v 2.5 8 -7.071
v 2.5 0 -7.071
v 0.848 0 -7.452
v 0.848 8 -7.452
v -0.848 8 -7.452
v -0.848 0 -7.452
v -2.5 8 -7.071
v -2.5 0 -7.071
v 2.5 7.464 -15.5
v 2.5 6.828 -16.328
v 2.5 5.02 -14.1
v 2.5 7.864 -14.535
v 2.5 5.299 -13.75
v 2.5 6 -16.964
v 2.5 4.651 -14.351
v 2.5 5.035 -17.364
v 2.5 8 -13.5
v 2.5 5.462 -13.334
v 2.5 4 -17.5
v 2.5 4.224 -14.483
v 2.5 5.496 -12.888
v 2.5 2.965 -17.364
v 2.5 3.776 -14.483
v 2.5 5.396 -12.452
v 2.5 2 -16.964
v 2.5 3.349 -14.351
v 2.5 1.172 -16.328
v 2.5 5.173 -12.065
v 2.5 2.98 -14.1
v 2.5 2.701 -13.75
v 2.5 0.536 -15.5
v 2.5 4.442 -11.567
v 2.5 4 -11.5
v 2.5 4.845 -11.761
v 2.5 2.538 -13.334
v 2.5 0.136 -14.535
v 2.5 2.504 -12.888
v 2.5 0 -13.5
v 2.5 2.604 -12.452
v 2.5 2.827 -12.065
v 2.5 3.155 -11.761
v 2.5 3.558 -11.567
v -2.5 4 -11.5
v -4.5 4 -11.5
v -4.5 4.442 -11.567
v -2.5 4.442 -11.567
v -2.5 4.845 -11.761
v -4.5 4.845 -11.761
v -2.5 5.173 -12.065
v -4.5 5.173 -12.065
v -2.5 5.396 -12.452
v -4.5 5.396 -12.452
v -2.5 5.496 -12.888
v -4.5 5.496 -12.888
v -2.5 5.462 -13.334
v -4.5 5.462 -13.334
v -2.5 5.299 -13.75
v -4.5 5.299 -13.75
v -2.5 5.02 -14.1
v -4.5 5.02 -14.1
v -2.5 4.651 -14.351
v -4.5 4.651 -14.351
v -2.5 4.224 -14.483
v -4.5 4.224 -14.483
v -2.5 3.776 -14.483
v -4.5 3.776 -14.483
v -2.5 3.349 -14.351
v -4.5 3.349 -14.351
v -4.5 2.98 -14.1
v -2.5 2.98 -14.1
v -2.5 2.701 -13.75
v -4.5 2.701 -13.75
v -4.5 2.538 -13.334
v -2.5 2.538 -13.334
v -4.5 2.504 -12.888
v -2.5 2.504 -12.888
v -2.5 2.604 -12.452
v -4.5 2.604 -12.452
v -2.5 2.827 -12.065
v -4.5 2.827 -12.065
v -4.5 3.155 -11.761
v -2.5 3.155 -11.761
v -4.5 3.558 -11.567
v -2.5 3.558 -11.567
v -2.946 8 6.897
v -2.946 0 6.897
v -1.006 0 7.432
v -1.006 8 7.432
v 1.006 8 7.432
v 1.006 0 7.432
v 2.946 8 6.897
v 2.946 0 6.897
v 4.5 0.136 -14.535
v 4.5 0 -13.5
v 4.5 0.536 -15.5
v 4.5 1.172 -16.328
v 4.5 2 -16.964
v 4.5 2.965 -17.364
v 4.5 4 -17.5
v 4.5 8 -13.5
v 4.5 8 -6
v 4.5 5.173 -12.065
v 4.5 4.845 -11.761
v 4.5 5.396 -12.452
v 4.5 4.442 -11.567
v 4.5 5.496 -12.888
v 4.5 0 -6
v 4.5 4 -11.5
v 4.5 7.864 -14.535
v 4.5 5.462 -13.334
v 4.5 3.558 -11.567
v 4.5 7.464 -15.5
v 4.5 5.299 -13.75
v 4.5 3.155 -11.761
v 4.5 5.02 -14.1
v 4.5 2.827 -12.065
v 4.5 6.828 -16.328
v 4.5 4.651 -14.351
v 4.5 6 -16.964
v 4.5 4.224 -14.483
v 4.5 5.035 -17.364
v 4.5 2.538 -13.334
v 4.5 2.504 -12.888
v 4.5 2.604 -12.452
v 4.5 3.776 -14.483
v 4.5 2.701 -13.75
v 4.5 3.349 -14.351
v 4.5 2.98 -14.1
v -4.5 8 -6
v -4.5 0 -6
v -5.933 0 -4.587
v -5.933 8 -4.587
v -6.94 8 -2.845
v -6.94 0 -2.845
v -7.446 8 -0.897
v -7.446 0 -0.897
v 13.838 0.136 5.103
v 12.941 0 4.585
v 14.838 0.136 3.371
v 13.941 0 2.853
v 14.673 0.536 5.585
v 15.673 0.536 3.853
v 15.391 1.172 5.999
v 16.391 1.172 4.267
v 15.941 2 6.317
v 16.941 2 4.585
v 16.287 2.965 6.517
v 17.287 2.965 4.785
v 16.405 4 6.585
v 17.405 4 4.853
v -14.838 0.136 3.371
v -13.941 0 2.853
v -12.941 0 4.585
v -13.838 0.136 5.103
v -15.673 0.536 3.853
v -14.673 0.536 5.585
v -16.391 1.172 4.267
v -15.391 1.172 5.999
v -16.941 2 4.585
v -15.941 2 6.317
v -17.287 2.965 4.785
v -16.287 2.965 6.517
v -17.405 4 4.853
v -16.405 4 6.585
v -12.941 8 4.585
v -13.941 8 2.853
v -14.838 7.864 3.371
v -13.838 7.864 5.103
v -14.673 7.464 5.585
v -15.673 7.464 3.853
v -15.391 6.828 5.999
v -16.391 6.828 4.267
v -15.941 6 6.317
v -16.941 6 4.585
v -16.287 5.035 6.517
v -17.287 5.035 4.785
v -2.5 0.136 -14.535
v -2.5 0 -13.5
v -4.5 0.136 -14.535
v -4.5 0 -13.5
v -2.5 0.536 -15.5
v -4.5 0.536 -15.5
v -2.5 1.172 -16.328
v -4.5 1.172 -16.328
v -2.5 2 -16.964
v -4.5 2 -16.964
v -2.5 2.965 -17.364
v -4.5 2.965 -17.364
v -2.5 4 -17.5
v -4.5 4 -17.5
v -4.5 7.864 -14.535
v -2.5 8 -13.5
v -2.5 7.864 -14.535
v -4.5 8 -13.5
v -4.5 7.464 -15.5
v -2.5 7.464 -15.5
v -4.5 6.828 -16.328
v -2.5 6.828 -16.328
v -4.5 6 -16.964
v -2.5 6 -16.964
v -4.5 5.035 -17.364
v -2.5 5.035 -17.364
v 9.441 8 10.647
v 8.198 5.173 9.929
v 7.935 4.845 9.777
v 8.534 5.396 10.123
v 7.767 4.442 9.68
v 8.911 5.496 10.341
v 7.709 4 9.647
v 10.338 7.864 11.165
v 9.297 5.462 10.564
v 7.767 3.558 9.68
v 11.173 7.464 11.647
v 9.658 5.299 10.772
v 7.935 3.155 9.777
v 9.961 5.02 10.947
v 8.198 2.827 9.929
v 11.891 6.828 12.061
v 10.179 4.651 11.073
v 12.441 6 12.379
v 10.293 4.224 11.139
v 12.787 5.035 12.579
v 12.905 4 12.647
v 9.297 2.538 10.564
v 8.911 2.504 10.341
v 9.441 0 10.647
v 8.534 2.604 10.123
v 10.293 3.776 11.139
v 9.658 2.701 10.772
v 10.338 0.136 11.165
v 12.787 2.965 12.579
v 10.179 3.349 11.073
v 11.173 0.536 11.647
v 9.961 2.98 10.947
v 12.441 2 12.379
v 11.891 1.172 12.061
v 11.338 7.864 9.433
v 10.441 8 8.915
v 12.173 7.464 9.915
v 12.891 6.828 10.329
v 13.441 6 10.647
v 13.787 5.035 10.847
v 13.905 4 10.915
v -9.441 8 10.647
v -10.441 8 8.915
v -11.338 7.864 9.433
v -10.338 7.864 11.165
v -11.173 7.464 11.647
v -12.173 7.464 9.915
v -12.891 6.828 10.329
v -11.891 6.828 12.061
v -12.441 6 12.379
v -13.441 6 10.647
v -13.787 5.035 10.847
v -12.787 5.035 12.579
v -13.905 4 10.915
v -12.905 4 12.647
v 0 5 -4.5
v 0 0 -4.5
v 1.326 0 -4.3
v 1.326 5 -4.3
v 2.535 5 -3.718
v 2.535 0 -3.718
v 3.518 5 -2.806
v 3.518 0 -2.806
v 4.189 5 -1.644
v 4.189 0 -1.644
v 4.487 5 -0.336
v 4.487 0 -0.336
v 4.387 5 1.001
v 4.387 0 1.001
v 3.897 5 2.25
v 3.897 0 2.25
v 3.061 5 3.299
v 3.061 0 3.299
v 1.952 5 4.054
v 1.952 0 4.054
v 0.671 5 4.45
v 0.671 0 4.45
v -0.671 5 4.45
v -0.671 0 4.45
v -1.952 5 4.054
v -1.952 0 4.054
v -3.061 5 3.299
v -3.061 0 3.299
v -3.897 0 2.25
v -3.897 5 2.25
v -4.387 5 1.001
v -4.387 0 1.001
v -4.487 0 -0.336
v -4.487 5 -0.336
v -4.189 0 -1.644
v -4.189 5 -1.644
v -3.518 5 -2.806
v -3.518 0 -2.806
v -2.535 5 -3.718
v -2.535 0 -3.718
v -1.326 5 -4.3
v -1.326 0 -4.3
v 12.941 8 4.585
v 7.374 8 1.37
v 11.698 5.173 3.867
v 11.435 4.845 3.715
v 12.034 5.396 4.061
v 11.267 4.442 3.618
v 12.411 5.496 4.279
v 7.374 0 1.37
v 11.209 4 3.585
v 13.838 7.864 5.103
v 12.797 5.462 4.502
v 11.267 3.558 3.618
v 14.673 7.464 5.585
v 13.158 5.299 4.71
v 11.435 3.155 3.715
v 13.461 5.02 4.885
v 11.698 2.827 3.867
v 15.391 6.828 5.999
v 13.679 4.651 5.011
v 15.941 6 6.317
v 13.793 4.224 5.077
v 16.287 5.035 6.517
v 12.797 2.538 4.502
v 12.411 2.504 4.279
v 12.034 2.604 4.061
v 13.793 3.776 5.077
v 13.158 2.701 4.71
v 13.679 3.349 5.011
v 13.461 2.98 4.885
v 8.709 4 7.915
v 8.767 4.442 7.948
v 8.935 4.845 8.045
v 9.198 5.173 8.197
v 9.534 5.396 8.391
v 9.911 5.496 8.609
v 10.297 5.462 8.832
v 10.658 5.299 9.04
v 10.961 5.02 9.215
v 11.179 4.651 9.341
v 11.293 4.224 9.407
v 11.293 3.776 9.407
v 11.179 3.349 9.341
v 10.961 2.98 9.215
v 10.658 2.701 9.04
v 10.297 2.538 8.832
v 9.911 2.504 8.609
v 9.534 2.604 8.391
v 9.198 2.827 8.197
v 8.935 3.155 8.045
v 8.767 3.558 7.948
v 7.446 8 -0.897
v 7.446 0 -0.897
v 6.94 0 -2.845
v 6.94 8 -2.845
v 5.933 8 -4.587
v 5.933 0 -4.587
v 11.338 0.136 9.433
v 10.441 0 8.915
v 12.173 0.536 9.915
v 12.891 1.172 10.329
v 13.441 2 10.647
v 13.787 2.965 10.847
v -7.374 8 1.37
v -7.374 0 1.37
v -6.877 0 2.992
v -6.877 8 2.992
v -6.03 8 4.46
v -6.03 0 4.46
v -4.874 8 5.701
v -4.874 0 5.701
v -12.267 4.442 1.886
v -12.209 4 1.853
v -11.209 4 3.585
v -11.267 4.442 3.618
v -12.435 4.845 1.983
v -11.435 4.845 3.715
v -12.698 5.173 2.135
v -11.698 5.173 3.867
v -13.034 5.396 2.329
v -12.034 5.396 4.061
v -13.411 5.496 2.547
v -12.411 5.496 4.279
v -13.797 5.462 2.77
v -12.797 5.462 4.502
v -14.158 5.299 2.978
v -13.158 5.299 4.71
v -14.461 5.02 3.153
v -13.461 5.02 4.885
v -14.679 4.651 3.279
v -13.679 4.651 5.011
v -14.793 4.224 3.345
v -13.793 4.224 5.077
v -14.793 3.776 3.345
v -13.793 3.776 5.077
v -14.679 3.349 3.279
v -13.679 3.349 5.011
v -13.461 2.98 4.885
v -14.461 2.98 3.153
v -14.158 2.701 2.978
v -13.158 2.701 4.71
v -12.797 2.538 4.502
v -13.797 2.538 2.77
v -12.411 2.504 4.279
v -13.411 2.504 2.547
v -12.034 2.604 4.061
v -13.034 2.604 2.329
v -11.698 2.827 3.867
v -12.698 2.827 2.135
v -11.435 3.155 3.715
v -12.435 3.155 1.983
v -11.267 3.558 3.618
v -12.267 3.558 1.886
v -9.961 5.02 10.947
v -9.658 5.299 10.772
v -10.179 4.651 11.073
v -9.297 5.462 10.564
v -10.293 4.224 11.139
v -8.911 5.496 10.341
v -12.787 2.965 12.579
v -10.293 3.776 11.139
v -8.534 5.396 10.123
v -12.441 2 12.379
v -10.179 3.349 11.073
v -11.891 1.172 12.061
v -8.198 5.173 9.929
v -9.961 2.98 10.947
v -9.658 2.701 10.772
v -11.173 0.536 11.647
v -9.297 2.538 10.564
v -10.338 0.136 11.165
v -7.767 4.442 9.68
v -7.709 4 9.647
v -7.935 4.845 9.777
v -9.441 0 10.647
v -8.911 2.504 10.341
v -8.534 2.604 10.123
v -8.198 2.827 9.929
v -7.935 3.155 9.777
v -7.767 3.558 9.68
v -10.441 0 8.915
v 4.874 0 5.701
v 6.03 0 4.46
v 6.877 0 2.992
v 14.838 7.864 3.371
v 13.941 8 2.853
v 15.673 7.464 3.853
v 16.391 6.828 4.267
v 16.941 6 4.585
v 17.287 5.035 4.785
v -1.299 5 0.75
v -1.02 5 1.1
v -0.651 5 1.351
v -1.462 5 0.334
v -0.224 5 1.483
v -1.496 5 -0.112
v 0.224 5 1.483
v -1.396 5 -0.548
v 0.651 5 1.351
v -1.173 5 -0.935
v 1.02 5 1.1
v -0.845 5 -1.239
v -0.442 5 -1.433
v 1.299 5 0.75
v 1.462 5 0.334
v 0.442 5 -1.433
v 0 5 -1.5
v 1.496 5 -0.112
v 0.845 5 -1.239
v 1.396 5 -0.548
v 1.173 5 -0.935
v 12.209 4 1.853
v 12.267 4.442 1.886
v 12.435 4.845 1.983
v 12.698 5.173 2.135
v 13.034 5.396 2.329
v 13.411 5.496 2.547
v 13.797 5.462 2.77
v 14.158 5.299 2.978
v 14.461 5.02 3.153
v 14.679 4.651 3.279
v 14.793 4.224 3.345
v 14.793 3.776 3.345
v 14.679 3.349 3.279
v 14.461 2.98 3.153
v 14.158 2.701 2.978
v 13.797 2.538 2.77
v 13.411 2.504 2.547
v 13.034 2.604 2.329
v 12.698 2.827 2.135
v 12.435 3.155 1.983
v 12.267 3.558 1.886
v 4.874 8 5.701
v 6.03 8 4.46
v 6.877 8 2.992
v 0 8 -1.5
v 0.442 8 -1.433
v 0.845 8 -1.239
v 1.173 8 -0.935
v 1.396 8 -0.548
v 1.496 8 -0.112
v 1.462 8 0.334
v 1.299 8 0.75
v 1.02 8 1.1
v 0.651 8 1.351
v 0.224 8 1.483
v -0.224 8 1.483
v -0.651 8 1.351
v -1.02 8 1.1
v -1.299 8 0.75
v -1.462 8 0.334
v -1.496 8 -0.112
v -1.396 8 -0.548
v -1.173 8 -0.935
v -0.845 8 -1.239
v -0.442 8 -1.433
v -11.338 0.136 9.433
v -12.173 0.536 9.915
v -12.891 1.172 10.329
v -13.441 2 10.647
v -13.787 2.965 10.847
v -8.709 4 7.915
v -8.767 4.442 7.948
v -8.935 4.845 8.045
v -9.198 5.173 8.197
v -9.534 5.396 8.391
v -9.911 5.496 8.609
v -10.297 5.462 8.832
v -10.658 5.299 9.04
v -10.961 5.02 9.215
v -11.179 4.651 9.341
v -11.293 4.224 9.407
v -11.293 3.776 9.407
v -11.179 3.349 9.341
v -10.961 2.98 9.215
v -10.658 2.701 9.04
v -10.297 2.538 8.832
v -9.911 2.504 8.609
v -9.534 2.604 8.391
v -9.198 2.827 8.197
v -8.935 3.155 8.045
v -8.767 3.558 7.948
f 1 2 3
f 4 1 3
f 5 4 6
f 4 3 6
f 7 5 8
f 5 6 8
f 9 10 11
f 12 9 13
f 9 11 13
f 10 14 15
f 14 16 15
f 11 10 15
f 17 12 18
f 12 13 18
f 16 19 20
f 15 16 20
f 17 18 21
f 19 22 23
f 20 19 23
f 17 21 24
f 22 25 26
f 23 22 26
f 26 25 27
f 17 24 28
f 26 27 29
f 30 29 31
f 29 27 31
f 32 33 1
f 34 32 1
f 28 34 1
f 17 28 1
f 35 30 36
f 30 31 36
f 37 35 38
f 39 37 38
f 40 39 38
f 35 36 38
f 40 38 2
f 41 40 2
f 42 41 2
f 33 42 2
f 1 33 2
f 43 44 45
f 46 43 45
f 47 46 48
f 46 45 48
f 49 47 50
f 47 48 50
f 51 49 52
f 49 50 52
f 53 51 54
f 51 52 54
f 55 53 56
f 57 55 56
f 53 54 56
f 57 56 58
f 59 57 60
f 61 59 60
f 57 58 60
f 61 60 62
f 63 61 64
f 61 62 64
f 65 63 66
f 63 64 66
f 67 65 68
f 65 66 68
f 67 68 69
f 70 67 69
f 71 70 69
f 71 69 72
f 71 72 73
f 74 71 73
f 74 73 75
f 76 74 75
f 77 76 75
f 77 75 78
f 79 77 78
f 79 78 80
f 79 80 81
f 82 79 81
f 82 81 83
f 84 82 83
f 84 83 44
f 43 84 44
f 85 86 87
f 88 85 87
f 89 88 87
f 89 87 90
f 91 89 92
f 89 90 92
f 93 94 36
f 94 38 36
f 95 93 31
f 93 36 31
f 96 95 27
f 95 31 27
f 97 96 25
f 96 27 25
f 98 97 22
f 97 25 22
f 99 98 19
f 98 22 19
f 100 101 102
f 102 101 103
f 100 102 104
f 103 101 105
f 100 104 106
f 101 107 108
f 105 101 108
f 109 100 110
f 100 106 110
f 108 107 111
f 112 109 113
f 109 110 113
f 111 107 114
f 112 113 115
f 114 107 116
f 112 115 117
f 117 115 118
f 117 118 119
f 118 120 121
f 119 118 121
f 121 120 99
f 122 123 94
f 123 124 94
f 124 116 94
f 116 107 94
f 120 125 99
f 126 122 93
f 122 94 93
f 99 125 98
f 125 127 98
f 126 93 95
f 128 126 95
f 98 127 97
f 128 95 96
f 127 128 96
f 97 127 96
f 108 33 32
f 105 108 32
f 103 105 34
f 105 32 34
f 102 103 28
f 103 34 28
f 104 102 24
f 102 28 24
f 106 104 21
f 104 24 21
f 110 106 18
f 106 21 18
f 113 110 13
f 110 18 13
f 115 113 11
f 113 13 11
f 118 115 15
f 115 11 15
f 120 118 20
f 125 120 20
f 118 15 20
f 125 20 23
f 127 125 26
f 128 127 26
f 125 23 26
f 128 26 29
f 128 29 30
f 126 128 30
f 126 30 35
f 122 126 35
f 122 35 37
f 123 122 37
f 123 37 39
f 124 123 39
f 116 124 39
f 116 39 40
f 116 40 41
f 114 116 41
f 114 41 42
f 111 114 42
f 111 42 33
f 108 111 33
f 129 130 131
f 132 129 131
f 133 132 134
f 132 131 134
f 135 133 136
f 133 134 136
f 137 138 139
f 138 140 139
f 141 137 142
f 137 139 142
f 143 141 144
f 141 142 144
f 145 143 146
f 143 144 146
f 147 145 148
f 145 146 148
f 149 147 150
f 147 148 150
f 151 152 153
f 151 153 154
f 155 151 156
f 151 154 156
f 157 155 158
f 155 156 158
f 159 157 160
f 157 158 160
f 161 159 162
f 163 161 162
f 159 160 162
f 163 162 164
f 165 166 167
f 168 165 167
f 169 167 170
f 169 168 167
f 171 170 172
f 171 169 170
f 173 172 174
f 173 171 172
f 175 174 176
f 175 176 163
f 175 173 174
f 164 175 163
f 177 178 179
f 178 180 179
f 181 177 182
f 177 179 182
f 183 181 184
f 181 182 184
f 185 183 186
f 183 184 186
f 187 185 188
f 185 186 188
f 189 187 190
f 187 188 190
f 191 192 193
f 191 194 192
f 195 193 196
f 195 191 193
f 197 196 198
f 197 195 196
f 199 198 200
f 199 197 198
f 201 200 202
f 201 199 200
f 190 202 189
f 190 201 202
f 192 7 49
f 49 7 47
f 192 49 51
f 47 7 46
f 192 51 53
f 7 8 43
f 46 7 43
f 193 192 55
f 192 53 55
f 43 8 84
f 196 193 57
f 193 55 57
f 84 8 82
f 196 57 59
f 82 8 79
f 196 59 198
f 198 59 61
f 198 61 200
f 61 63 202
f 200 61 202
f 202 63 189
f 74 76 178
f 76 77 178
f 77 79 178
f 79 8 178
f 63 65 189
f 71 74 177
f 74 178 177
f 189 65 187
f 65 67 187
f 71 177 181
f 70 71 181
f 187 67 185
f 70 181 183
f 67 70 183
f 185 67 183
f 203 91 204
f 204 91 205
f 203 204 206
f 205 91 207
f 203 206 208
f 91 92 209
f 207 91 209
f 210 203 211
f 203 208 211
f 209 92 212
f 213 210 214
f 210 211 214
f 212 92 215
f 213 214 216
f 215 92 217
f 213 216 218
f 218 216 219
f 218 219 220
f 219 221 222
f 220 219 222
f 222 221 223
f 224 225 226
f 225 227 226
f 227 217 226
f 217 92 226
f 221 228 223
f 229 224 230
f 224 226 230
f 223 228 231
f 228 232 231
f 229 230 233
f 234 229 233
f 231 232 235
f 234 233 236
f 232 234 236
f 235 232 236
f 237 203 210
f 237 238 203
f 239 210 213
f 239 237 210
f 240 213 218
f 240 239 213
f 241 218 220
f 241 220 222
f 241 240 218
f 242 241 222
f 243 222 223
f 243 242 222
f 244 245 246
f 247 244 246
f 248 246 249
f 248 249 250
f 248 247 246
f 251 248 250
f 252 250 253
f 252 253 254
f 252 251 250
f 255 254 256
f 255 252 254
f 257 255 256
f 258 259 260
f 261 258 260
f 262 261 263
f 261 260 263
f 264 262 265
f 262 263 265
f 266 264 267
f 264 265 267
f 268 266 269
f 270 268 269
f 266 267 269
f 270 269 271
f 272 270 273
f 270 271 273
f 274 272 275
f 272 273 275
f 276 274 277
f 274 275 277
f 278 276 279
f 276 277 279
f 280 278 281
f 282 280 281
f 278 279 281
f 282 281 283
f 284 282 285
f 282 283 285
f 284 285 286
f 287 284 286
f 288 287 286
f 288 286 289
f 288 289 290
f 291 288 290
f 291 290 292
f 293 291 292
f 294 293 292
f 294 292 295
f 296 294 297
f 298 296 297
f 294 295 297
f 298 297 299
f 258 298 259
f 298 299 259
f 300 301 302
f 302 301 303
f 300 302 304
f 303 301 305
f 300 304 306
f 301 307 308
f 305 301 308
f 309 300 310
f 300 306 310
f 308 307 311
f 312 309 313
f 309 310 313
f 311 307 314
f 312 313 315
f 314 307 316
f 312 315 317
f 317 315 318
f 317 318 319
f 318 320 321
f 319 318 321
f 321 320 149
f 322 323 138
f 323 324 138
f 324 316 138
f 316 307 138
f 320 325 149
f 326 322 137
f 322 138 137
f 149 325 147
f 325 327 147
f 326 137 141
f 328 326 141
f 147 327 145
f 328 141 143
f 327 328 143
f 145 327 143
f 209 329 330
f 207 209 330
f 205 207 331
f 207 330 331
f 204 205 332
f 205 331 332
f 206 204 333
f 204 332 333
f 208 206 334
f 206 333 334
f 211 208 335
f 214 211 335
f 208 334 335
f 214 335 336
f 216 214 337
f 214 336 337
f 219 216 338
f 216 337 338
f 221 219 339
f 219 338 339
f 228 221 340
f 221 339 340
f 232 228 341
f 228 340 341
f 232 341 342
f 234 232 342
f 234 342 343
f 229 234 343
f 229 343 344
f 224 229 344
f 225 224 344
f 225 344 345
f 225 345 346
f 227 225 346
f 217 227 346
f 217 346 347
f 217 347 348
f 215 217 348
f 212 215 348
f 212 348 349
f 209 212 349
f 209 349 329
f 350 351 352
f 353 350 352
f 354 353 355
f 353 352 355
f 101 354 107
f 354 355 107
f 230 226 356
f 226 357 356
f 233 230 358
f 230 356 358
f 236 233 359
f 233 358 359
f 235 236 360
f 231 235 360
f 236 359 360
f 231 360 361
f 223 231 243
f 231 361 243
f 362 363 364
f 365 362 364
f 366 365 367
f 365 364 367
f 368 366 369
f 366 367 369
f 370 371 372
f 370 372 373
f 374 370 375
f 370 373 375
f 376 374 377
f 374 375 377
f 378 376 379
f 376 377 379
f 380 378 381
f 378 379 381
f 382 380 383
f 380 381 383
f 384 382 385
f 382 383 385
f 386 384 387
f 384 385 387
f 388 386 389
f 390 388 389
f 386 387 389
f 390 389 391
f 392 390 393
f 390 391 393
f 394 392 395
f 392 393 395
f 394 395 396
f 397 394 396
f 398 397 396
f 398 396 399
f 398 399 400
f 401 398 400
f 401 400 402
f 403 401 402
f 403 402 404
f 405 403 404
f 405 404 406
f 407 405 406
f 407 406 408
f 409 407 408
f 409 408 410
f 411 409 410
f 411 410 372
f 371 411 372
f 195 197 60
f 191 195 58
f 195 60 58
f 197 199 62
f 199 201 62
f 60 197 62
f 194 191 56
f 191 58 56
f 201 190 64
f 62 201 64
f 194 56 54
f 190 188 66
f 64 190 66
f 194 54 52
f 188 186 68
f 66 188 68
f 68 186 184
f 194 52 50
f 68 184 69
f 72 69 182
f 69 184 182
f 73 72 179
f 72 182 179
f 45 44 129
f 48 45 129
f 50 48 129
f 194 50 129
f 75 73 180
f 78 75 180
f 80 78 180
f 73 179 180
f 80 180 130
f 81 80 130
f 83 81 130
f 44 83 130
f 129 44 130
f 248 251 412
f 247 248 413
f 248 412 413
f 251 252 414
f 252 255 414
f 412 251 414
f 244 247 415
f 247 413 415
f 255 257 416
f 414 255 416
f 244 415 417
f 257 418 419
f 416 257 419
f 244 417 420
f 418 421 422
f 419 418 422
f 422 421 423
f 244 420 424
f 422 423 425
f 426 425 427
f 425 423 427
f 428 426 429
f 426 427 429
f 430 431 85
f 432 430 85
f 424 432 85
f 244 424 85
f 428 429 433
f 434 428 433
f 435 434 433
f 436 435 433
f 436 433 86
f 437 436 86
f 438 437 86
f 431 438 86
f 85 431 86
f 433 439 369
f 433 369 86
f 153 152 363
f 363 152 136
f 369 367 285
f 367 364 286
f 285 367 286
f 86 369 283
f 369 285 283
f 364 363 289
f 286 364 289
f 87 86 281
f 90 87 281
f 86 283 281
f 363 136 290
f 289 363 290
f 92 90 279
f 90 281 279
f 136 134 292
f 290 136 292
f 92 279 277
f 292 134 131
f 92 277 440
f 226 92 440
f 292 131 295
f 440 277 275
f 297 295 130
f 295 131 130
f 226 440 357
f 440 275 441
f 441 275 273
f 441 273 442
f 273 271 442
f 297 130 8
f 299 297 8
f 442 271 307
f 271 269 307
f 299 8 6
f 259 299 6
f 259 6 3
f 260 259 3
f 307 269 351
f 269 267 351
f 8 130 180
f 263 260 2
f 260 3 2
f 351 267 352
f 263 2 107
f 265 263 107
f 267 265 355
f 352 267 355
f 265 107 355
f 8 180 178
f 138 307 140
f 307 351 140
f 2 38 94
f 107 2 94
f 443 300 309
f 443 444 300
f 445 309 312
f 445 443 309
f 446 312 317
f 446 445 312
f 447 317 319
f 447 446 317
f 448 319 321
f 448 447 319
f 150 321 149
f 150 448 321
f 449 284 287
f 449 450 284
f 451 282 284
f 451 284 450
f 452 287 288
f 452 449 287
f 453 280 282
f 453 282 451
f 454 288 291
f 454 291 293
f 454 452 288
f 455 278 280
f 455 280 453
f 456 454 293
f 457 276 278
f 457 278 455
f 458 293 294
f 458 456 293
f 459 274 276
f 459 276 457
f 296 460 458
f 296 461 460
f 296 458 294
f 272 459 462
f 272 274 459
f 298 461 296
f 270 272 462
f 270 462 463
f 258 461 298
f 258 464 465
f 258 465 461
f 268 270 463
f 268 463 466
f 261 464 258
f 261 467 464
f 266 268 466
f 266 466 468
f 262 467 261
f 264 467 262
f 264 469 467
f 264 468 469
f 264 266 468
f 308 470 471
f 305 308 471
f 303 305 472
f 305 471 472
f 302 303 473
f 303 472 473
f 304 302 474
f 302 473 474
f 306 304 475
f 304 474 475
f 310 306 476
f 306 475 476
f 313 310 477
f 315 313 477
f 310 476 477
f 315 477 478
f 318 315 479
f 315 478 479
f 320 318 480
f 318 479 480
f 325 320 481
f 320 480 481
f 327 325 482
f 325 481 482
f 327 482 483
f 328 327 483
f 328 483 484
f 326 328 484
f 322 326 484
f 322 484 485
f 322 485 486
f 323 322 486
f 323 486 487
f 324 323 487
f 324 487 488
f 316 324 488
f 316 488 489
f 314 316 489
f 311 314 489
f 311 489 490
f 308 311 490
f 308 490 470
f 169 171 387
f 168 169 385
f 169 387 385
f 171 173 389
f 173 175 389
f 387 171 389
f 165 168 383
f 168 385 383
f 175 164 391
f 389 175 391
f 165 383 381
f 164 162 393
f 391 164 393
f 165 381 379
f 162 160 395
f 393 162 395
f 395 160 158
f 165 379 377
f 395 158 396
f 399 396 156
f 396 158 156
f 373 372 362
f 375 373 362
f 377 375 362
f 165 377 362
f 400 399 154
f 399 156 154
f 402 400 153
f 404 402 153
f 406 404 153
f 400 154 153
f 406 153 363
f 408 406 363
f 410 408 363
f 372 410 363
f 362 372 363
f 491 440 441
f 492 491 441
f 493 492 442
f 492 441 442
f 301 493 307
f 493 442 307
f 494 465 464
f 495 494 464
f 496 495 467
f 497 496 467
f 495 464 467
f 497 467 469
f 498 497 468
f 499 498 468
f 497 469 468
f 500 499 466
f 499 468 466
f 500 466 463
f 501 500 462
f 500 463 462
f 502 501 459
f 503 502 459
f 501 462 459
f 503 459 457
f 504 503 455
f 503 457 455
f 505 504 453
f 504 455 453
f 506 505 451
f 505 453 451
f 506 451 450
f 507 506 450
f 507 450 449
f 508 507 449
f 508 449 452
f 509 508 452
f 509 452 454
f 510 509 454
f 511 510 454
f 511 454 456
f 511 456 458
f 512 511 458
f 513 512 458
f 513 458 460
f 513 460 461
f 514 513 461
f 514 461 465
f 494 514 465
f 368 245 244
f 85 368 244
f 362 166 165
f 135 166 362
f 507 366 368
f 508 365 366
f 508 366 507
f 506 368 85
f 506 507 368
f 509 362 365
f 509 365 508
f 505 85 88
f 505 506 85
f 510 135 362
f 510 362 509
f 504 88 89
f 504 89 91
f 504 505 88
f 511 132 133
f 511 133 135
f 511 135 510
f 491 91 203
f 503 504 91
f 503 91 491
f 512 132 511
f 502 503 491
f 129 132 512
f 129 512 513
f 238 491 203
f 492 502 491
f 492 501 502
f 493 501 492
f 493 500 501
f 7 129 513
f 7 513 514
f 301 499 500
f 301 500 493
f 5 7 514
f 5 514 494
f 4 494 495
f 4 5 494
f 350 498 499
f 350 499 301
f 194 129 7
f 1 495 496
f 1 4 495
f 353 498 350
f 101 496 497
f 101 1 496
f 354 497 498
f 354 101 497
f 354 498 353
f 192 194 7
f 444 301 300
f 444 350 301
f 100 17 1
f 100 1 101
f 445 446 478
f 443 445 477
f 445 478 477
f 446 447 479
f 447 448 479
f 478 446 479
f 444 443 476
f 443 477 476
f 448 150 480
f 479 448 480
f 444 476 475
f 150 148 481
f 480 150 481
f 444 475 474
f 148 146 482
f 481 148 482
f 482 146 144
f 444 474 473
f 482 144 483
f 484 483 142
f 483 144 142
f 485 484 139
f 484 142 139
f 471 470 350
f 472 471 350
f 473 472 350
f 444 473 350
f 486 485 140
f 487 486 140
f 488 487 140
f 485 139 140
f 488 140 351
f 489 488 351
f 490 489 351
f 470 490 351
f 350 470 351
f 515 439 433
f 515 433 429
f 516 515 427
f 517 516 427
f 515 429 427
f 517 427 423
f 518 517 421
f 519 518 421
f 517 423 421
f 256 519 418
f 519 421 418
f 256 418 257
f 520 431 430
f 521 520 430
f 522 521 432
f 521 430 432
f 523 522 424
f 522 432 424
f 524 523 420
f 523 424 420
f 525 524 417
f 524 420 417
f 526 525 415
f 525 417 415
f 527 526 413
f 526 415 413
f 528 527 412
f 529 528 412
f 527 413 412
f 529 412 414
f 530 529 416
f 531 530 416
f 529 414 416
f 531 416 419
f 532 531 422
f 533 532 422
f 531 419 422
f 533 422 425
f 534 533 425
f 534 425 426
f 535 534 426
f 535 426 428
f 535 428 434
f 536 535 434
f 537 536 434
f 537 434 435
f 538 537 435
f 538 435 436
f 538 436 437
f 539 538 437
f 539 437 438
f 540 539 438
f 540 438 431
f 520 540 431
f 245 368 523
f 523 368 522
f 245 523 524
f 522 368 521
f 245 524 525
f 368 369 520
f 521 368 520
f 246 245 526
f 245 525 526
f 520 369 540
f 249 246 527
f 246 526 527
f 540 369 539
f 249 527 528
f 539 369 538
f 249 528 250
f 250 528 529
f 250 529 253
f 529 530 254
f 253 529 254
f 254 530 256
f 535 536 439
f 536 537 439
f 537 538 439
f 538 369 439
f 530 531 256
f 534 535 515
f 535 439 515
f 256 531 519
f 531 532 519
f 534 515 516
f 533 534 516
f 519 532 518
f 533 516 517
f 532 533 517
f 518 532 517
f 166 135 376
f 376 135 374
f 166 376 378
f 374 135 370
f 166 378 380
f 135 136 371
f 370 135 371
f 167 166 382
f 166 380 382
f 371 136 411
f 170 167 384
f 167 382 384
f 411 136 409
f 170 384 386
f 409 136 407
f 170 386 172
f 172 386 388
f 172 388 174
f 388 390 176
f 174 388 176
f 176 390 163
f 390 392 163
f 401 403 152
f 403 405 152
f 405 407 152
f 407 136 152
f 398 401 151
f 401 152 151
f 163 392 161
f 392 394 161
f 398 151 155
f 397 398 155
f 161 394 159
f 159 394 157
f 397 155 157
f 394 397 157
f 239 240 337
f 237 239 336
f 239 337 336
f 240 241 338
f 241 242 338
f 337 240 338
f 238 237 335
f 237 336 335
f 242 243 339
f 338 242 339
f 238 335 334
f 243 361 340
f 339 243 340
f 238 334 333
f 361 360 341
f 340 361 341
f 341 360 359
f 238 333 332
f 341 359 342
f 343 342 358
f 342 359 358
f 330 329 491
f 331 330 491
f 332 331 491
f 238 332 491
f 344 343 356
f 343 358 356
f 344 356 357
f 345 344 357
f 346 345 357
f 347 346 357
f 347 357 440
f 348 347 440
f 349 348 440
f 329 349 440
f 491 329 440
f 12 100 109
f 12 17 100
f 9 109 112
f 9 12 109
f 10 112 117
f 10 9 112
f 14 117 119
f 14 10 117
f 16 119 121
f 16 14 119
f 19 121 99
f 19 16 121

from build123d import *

# Parameters (mm, degrees)
BOSS_EXTRUDE1_DEPTH = 8
CUT_EXTRUDE1_REACH  = 32.136
SKETCH2_R           = 1.5
CUT_EXTRUDE2_REACH  = 31.156
SKETCH3_R           = 1.5
CUT_EXTRUDE3_REACH  = 28.908
SKETCH4_R           = 1.5
SKETCH5_R           = 4.5
CUT_EXTRUDE4_DEPTH  = 5
SKETCH6_R           = 1.5
CUT_EXTRUDE5_DEPTH  = 26.183317902
FILLET1_R           = 4


with BuildPart() as part:
    # Sketch1 → Boss-Extrude1 (new body)
    with BuildSketch(Plane(origin=(0, 0, 0), x_dir=(1, 0, 0), z_dir=(0, 1, 0))):
        with BuildLine():
            ThreePointArc((-2.946152423, -6.897114317), (-3.95544326, -6.372163574), (-4.873724357, -5.700597415))
            Line((-4.873724357, -5.700597415), (-13.905444566, -10.915063509))
            Line((-13.905444566, -10.915063509), (-12.905444566, -12.647114317))
            Line((-12.905444566, -12.647114317), (-2.946152423, -6.897114317))
        make_face()
        with BuildLine():
            Line((-16.405444566, -6.584936491), (-7.373724357, -1.370470396))
            ThreePointArc((-7.373724357, -1.370470396), (-7.496177162, -0.23943256), (-7.446152423, 0.897114317))
            Line((-7.446152423, 0.897114317), (-17.405444566, -4.852885683))
            Line((-17.405444566, -4.852885683), (-16.405444566, -6.584936491))
        make_face()
        Polygon((-2.5, 1.443375673), (-2.5, 0), (0, 0), (-1.25, 2.165063509), align=None)
        Polygon((1.25, -2.165063509), (0, 0), (-1.25, -2.165063509), (0, -2.886751346), align=None)
        with BuildLine():
            Line((-7.446152423, 0.897114317), (-4.5, 2.598076211))
            Line((-4.5, 2.598076211), (-4.5, 6))
            ThreePointArc((-4.5, 6), (-6.495190528, 3.75), (-7.446152423, 0.897114317))
        make_face()
        with BuildLine():
            Line((0, -5.196152423), (-2.946152423, -6.897114317))
            ThreePointArc((-2.946152423, -6.897114317), (0, -7.5), (2.946152423, -6.897114317))
            Line((2.946152423, -6.897114317), (0, -5.196152423))
        make_face()
        Polygon((1.25, 2.165063509), (0, 0), (2.5, 0), (2.5, 1.443375673), align=None)
        with BuildLine():
            ThreePointArc((7.446152423, 0.897114317), (6.495190528, 3.75), (4.5, 6))
            Line((4.5, 6), (4.5, 2.598076211))
            Line((4.5, 2.598076211), (7.446152423, 0.897114317))
        make_face()
        with BuildLine():
            ThreePointArc((7.5, 0), (7.468364368, -0.688137822), (7.373724357, -1.370470396))
            Line((7.373724357, -1.370470396), (16.405444566, -6.584936491))
            Line((16.405444566, -6.584936491), (17.405444566, -4.852885683))
            Line((17.405444566, -4.852885683), (7.446152423, 0.897114317))
            ThreePointArc((7.446152423, 0.897114317), (7.486526002, 0.449364457), (7.5, 0))
        make_face()
        with BuildLine():
            ThreePointArc((4.873724357, -5.700597415), (3.95544326, -6.372163574), (2.946152423, -6.897114317))
            Line((2.946152423, -6.897114317), (12.905444566, -12.647114317))
            Line((12.905444566, -12.647114317), (13.905444566, -10.915063509))
            Line((13.905444566, -10.915063509), (4.873724357, -5.700597415))
        make_face()
        with BuildLine():
            Line((2.5, 17.5), (2.5, 7.071067812))
            ThreePointArc((2.5, 7.071067812), (3.540733902, 6.611596134), (4.5, 6))
            Line((4.5, 6), (4.5, 17.5))
            Line((4.5, 17.5), (2.5, 17.5))
        make_face()
        with BuildLine():
            Line((-4.5, 17.5), (-4.5, 6))
            ThreePointArc((-4.5, 6), (-3.540733902, 6.611596134), (-2.5, 7.071067812))
            Line((-2.5, 7.071067812), (-2.5, 17.5))
            Line((-2.5, 17.5), (-4.5, 17.5))
        make_face()
        with BuildLine():
            Line((-2.5, 0), (-4.5, 0))
            Line((-4.5, 0), (-4.5, 0.288675135))
            Line((-4.5, 0.288675135), (-7.373724357, -1.370470396))
            ThreePointArc((-7.373724357, -1.370470396), (-6.495190528, -3.75), (-4.873724357, -5.700597415))
            Line((-4.873724357, -5.700597415), (-2, -4.041451884))
            Line((-2, -4.041451884), (-2.25, -3.897114317))
            Line((-2.25, -3.897114317), (-1.25, -2.165063509))
            Line((-1.25, -2.165063509), (0, 0))
            Line((0, 0), (-2.5, 0))
        make_face()
        Polygon((-4.5, 0.288675135), (-4.5, 0), (-2.5, 0), (-2.5, 1.443375673), align=None)
        with BuildLine():
            Line((-7.373724357, -1.370470396), (-4.5, 0.288675135))
            Line((-4.5, 0.288675135), (-4.5, 2.598076211))
            Line((-4.5, 2.598076211), (-7.446152423, 0.897114317))
            ThreePointArc((-7.446152423, 0.897114317), (-7.496177162, -0.23943256), (-7.373724357, -1.370470396))
        make_face()
        Polygon((-4.5, 2.598076211), (-4.5, 0.288675135), (-2.5, 1.443375673), (-2.5, 3.75277675), align=None)
        with BuildLine():
            Line((-4.5, 6), (-4.5, 2.598076211))
            Line((-4.5, 2.598076211), (-2.5, 3.75277675))
            Line((-2.5, 3.75277675), (-2.5, 7.071067812))
            ThreePointArc((-2.5, 7.071067812), (-3.540733902, 6.611596134), (-4.5, 6))
        make_face()
        Polygon((-2.5, 3.75277675), (-2.5, 1.443375673), (-1.25, 2.165063509), (-2.25, 3.897114317), align=None)
        with BuildLine():
            Line((2.5, 0), (0, 0))
            Line((0, 0), (1.25, -2.165063509))
            Line((1.25, -2.165063509), (2.25, -3.897114317))
            Line((2.25, -3.897114317), (2, -4.041451884))
            Line((2, -4.041451884), (4.873724357, -5.700597415))
            ThreePointArc((4.873724357, -5.700597415), (6.495190528, -3.75), (7.373724357, -1.370470396))
            Line((7.373724357, -1.370470396), (4.5, 0.288675135))
            Line((4.5, 0.288675135), (4.5, 0))
            Line((4.5, 0), (2.5, 0))
        make_face()
        with BuildLine():
            Line((-1.25, 2.165063509), (0, 0))
            Line((0, 0), (1.25, 2.165063509))
            Line((1.25, 2.165063509), (2.25, 3.897114317))
            Line((2.25, 3.897114317), (2.5, 3.75277675))
            Line((2.5, 3.75277675), (2.5, 7.071067812))
            ThreePointArc((2.5, 7.071067812), (0, 7.5), (-2.5, 7.071067812))
            Line((-2.5, 7.071067812), (-2.5, 3.75277675))
            Line((-2.5, 3.75277675), (-2.25, 3.897114317))
            Line((-2.25, 3.897114317), (-1.25, 2.165063509))
        make_face()
        with BuildLine():
            Line((-2, -4.041451884), (-4.873724357, -5.700597415))
            ThreePointArc((-4.873724357, -5.700597415), (-3.95544326, -6.372163574), (-2.946152423, -6.897114317))
            Line((-2.946152423, -6.897114317), (0, -5.196152423))
            Line((0, -5.196152423), (-2, -4.041451884))
        make_face()
        Polygon((2.5, 1.443375673), (2.5, 0), (4.5, 0), (4.5, 0.288675135), align=None)
        Polygon((2.25, -3.897114317), (1.25, -2.165063509), (0, -2.886751346), (2, -4.041451884), align=None)
        Polygon((2.25, 3.897114317), (1.25, 2.165063509), (2.5, 1.443375673), (2.5, 3.75277675), align=None)
        Polygon((0, -2.886751346), (-1.25, -2.165063509), (-2.25, -3.897114317), (-2, -4.041451884), align=None)
        Polygon((0, -2.886751346), (-2, -4.041451884), (0, -5.196152423), (2, -4.041451884), align=None)
        Polygon((2.5, 3.75277675), (2.5, 1.443375673), (4.5, 0.288675135), (4.5, 2.598076211), align=None)
        with BuildLine():
            ThreePointArc((4.5, 6), (3.540733902, 6.611596134), (2.5, 7.071067812))
            Line((2.5, 7.071067812), (2.5, 3.75277675))
            Line((2.5, 3.75277675), (4.5, 2.598076211))
            Line((4.5, 2.598076211), (4.5, 6))
        make_face()
        with BuildLine():
            Line((2, -4.041451884), (0, -5.196152423))
            Line((0, -5.196152423), (2.946152423, -6.897114317))
            ThreePointArc((2.946152423, -6.897114317), (3.95544326, -6.372163574), (4.873724357, -5.700597415))
            Line((4.873724357, -5.700597415), (2, -4.041451884))
        make_face()
        with BuildLine():
            Line((4.5, 2.598076211), (4.5, 0.288675135))
            Line((4.5, 0.288675135), (7.373724357, -1.370470396))
            ThreePointArc((7.373724357, -1.370470396), (7.468364368, -0.688137822), (7.5, 0))
            ThreePointArc((7.5, 0), (7.486526002, 0.449364457), (7.446152423, 0.897114317))
            Line((7.446152423, 0.897114317), (4.5, 2.598076211))
        make_face()
    extrude(amount=BOSS_EXTRUDE1_DEPTH)

    # Cut-Extrude1: up to this face of the body (flat: up to its plane)
    cut_extrude1_end = Plane(part.part.faces().sort_by_distance((-12.425798494, 4, 1.977885683))[0])
    # Sketch2 → Cut-Extrude1 (cut, up to the picked face)
    with BuildSketch(Plane(origin=(2.25, 0, 3.897114317), x_dir=(0.8660254037844364, 0, -0.5000000000000039), z_dir=(0.5000000000000039, 0, 0.8660254037844364)), mode=Mode.PRIVATE) as cut_extrude1_sk1:
        with Locations((-13, 4)):
            Circle(SKETCH2_R)
    cut_extrude1_tool1 = split(extrude(cut_extrude1_sk1.sketch, amount=-CUT_EXTRUDE1_REACH, mode=Mode.PRIVATE), bisect_by=cut_extrude1_end, keep=Keep.BOTH, mode=Mode.PRIVATE)
    add(cut_extrude1_tool1.solids().sort_by(Axis((-9.00833, 4, 10.397114), (-0.5000000000000039, 0, -0.8660254037844364)))[0], mode=Mode.SUBTRACT)

    # Cut-Extrude2: up to this face of the body (flat: up to its plane)
    cut_extrude2_end = Plane(part.part.faces().sort_by_distance((4.5, 4, -11.75))[0])
    # Sketch3 → Cut-Extrude2 (cut, up to the picked face)
    with BuildSketch(Plane.ZY.offset(4.5), mode=Mode.PRIVATE) as cut_extrude2_sk1:
        with Locations((-13, 4)):
            Circle(SKETCH3_R)
    cut_extrude2_tool1 = split(extrude(cut_extrude2_sk1.sketch, amount=-CUT_EXTRUDE2_REACH, mode=Mode.PRIVATE), bisect_by=cut_extrude2_end, keep=Keep.BOTH, mode=Mode.PRIVATE)
    add(cut_extrude2_tool1.solids().sort_by(Axis((-4.5, 4, -13), (1, 0, 0)))[0], mode=Mode.SUBTRACT)

    # Cut-Extrude3: up to this face of the body (flat: up to its plane)
    cut_extrude3_end = Plane(part.part.faces().sort_by_distance((7.925798494, 4, 9.772114317))[0])
    # Sketch4 → Cut-Extrude3 (cut, up to the picked face)
    with BuildSketch(Plane(origin=(2.25, 0, -3.897114317), x_dir=(-0.8660254037844363, 0, -0.5000000000000042), z_dir=(0.5000000000000041, 0, -0.8660254037844362)), mode=Mode.PRIVATE) as cut_extrude3_sk1:
        with Locations((-13, 4)):
            Circle(SKETCH4_R)
    cut_extrude3_tool1 = split(extrude(cut_extrude3_sk1.sketch, amount=-CUT_EXTRUDE3_REACH, mode=Mode.PRIVATE), bisect_by=cut_extrude3_end, keep=Keep.BOTH, mode=Mode.PRIVATE)
    add(cut_extrude3_tool1.solids().sort_by(Axis((13.50833, 4, 2.602886), (-0.5000000000000041, 0, 0.8660254037844362)))[0], mode=Mode.SUBTRACT)

    # Sketch5 → Cut-Extrude4 (cut)
    with BuildSketch(Plane.XZ):
        with Locations(Location((0, 0, 0), (0, 0, 270))):
            Circle(SKETCH5_R)
    extrude(amount=-CUT_EXTRUDE4_DEPTH, mode=Mode.SUBTRACT)

    # Sketch6 → Cut-Extrude5 (cut, through all)
    with BuildSketch(Plane.XZ.offset(-5)):
        with Locations(Location((0, 0, 0), (0, 0, 270))):
            Circle(SKETCH6_R)
    extrude(amount=-CUT_EXTRUDE5_DEPTH, mode=Mode.SUBTRACT)

    # Fillet1
    fillet1_edges = [part.edges().sort_by_distance(p)[0] for p in [
        (-13.405444566, 0, 11.781088913),
        (-13.405444566, 8, 11.781088913),
        (-16.905444566, 0, 5.718911087),
        (-16.905444566, 8, 5.718911087),
        (-3.5, 0, -17.5),
        (-3.5, 8, -17.5),
        (3.5, 0, -17.5),
        (3.5, 8, -17.5),
        (13.405444566, 0, 11.781088913),
        (13.405444566, 8, 11.781088913),
        (16.905444566, 0, 5.718911087),
        (16.905444566, 8, 5.718911087),
    ]]
    fillet(fillet1_edges, radius=FILLET1_R - 0.0001)  # a hair under: the kernel refuses the full size


solid = part.part
